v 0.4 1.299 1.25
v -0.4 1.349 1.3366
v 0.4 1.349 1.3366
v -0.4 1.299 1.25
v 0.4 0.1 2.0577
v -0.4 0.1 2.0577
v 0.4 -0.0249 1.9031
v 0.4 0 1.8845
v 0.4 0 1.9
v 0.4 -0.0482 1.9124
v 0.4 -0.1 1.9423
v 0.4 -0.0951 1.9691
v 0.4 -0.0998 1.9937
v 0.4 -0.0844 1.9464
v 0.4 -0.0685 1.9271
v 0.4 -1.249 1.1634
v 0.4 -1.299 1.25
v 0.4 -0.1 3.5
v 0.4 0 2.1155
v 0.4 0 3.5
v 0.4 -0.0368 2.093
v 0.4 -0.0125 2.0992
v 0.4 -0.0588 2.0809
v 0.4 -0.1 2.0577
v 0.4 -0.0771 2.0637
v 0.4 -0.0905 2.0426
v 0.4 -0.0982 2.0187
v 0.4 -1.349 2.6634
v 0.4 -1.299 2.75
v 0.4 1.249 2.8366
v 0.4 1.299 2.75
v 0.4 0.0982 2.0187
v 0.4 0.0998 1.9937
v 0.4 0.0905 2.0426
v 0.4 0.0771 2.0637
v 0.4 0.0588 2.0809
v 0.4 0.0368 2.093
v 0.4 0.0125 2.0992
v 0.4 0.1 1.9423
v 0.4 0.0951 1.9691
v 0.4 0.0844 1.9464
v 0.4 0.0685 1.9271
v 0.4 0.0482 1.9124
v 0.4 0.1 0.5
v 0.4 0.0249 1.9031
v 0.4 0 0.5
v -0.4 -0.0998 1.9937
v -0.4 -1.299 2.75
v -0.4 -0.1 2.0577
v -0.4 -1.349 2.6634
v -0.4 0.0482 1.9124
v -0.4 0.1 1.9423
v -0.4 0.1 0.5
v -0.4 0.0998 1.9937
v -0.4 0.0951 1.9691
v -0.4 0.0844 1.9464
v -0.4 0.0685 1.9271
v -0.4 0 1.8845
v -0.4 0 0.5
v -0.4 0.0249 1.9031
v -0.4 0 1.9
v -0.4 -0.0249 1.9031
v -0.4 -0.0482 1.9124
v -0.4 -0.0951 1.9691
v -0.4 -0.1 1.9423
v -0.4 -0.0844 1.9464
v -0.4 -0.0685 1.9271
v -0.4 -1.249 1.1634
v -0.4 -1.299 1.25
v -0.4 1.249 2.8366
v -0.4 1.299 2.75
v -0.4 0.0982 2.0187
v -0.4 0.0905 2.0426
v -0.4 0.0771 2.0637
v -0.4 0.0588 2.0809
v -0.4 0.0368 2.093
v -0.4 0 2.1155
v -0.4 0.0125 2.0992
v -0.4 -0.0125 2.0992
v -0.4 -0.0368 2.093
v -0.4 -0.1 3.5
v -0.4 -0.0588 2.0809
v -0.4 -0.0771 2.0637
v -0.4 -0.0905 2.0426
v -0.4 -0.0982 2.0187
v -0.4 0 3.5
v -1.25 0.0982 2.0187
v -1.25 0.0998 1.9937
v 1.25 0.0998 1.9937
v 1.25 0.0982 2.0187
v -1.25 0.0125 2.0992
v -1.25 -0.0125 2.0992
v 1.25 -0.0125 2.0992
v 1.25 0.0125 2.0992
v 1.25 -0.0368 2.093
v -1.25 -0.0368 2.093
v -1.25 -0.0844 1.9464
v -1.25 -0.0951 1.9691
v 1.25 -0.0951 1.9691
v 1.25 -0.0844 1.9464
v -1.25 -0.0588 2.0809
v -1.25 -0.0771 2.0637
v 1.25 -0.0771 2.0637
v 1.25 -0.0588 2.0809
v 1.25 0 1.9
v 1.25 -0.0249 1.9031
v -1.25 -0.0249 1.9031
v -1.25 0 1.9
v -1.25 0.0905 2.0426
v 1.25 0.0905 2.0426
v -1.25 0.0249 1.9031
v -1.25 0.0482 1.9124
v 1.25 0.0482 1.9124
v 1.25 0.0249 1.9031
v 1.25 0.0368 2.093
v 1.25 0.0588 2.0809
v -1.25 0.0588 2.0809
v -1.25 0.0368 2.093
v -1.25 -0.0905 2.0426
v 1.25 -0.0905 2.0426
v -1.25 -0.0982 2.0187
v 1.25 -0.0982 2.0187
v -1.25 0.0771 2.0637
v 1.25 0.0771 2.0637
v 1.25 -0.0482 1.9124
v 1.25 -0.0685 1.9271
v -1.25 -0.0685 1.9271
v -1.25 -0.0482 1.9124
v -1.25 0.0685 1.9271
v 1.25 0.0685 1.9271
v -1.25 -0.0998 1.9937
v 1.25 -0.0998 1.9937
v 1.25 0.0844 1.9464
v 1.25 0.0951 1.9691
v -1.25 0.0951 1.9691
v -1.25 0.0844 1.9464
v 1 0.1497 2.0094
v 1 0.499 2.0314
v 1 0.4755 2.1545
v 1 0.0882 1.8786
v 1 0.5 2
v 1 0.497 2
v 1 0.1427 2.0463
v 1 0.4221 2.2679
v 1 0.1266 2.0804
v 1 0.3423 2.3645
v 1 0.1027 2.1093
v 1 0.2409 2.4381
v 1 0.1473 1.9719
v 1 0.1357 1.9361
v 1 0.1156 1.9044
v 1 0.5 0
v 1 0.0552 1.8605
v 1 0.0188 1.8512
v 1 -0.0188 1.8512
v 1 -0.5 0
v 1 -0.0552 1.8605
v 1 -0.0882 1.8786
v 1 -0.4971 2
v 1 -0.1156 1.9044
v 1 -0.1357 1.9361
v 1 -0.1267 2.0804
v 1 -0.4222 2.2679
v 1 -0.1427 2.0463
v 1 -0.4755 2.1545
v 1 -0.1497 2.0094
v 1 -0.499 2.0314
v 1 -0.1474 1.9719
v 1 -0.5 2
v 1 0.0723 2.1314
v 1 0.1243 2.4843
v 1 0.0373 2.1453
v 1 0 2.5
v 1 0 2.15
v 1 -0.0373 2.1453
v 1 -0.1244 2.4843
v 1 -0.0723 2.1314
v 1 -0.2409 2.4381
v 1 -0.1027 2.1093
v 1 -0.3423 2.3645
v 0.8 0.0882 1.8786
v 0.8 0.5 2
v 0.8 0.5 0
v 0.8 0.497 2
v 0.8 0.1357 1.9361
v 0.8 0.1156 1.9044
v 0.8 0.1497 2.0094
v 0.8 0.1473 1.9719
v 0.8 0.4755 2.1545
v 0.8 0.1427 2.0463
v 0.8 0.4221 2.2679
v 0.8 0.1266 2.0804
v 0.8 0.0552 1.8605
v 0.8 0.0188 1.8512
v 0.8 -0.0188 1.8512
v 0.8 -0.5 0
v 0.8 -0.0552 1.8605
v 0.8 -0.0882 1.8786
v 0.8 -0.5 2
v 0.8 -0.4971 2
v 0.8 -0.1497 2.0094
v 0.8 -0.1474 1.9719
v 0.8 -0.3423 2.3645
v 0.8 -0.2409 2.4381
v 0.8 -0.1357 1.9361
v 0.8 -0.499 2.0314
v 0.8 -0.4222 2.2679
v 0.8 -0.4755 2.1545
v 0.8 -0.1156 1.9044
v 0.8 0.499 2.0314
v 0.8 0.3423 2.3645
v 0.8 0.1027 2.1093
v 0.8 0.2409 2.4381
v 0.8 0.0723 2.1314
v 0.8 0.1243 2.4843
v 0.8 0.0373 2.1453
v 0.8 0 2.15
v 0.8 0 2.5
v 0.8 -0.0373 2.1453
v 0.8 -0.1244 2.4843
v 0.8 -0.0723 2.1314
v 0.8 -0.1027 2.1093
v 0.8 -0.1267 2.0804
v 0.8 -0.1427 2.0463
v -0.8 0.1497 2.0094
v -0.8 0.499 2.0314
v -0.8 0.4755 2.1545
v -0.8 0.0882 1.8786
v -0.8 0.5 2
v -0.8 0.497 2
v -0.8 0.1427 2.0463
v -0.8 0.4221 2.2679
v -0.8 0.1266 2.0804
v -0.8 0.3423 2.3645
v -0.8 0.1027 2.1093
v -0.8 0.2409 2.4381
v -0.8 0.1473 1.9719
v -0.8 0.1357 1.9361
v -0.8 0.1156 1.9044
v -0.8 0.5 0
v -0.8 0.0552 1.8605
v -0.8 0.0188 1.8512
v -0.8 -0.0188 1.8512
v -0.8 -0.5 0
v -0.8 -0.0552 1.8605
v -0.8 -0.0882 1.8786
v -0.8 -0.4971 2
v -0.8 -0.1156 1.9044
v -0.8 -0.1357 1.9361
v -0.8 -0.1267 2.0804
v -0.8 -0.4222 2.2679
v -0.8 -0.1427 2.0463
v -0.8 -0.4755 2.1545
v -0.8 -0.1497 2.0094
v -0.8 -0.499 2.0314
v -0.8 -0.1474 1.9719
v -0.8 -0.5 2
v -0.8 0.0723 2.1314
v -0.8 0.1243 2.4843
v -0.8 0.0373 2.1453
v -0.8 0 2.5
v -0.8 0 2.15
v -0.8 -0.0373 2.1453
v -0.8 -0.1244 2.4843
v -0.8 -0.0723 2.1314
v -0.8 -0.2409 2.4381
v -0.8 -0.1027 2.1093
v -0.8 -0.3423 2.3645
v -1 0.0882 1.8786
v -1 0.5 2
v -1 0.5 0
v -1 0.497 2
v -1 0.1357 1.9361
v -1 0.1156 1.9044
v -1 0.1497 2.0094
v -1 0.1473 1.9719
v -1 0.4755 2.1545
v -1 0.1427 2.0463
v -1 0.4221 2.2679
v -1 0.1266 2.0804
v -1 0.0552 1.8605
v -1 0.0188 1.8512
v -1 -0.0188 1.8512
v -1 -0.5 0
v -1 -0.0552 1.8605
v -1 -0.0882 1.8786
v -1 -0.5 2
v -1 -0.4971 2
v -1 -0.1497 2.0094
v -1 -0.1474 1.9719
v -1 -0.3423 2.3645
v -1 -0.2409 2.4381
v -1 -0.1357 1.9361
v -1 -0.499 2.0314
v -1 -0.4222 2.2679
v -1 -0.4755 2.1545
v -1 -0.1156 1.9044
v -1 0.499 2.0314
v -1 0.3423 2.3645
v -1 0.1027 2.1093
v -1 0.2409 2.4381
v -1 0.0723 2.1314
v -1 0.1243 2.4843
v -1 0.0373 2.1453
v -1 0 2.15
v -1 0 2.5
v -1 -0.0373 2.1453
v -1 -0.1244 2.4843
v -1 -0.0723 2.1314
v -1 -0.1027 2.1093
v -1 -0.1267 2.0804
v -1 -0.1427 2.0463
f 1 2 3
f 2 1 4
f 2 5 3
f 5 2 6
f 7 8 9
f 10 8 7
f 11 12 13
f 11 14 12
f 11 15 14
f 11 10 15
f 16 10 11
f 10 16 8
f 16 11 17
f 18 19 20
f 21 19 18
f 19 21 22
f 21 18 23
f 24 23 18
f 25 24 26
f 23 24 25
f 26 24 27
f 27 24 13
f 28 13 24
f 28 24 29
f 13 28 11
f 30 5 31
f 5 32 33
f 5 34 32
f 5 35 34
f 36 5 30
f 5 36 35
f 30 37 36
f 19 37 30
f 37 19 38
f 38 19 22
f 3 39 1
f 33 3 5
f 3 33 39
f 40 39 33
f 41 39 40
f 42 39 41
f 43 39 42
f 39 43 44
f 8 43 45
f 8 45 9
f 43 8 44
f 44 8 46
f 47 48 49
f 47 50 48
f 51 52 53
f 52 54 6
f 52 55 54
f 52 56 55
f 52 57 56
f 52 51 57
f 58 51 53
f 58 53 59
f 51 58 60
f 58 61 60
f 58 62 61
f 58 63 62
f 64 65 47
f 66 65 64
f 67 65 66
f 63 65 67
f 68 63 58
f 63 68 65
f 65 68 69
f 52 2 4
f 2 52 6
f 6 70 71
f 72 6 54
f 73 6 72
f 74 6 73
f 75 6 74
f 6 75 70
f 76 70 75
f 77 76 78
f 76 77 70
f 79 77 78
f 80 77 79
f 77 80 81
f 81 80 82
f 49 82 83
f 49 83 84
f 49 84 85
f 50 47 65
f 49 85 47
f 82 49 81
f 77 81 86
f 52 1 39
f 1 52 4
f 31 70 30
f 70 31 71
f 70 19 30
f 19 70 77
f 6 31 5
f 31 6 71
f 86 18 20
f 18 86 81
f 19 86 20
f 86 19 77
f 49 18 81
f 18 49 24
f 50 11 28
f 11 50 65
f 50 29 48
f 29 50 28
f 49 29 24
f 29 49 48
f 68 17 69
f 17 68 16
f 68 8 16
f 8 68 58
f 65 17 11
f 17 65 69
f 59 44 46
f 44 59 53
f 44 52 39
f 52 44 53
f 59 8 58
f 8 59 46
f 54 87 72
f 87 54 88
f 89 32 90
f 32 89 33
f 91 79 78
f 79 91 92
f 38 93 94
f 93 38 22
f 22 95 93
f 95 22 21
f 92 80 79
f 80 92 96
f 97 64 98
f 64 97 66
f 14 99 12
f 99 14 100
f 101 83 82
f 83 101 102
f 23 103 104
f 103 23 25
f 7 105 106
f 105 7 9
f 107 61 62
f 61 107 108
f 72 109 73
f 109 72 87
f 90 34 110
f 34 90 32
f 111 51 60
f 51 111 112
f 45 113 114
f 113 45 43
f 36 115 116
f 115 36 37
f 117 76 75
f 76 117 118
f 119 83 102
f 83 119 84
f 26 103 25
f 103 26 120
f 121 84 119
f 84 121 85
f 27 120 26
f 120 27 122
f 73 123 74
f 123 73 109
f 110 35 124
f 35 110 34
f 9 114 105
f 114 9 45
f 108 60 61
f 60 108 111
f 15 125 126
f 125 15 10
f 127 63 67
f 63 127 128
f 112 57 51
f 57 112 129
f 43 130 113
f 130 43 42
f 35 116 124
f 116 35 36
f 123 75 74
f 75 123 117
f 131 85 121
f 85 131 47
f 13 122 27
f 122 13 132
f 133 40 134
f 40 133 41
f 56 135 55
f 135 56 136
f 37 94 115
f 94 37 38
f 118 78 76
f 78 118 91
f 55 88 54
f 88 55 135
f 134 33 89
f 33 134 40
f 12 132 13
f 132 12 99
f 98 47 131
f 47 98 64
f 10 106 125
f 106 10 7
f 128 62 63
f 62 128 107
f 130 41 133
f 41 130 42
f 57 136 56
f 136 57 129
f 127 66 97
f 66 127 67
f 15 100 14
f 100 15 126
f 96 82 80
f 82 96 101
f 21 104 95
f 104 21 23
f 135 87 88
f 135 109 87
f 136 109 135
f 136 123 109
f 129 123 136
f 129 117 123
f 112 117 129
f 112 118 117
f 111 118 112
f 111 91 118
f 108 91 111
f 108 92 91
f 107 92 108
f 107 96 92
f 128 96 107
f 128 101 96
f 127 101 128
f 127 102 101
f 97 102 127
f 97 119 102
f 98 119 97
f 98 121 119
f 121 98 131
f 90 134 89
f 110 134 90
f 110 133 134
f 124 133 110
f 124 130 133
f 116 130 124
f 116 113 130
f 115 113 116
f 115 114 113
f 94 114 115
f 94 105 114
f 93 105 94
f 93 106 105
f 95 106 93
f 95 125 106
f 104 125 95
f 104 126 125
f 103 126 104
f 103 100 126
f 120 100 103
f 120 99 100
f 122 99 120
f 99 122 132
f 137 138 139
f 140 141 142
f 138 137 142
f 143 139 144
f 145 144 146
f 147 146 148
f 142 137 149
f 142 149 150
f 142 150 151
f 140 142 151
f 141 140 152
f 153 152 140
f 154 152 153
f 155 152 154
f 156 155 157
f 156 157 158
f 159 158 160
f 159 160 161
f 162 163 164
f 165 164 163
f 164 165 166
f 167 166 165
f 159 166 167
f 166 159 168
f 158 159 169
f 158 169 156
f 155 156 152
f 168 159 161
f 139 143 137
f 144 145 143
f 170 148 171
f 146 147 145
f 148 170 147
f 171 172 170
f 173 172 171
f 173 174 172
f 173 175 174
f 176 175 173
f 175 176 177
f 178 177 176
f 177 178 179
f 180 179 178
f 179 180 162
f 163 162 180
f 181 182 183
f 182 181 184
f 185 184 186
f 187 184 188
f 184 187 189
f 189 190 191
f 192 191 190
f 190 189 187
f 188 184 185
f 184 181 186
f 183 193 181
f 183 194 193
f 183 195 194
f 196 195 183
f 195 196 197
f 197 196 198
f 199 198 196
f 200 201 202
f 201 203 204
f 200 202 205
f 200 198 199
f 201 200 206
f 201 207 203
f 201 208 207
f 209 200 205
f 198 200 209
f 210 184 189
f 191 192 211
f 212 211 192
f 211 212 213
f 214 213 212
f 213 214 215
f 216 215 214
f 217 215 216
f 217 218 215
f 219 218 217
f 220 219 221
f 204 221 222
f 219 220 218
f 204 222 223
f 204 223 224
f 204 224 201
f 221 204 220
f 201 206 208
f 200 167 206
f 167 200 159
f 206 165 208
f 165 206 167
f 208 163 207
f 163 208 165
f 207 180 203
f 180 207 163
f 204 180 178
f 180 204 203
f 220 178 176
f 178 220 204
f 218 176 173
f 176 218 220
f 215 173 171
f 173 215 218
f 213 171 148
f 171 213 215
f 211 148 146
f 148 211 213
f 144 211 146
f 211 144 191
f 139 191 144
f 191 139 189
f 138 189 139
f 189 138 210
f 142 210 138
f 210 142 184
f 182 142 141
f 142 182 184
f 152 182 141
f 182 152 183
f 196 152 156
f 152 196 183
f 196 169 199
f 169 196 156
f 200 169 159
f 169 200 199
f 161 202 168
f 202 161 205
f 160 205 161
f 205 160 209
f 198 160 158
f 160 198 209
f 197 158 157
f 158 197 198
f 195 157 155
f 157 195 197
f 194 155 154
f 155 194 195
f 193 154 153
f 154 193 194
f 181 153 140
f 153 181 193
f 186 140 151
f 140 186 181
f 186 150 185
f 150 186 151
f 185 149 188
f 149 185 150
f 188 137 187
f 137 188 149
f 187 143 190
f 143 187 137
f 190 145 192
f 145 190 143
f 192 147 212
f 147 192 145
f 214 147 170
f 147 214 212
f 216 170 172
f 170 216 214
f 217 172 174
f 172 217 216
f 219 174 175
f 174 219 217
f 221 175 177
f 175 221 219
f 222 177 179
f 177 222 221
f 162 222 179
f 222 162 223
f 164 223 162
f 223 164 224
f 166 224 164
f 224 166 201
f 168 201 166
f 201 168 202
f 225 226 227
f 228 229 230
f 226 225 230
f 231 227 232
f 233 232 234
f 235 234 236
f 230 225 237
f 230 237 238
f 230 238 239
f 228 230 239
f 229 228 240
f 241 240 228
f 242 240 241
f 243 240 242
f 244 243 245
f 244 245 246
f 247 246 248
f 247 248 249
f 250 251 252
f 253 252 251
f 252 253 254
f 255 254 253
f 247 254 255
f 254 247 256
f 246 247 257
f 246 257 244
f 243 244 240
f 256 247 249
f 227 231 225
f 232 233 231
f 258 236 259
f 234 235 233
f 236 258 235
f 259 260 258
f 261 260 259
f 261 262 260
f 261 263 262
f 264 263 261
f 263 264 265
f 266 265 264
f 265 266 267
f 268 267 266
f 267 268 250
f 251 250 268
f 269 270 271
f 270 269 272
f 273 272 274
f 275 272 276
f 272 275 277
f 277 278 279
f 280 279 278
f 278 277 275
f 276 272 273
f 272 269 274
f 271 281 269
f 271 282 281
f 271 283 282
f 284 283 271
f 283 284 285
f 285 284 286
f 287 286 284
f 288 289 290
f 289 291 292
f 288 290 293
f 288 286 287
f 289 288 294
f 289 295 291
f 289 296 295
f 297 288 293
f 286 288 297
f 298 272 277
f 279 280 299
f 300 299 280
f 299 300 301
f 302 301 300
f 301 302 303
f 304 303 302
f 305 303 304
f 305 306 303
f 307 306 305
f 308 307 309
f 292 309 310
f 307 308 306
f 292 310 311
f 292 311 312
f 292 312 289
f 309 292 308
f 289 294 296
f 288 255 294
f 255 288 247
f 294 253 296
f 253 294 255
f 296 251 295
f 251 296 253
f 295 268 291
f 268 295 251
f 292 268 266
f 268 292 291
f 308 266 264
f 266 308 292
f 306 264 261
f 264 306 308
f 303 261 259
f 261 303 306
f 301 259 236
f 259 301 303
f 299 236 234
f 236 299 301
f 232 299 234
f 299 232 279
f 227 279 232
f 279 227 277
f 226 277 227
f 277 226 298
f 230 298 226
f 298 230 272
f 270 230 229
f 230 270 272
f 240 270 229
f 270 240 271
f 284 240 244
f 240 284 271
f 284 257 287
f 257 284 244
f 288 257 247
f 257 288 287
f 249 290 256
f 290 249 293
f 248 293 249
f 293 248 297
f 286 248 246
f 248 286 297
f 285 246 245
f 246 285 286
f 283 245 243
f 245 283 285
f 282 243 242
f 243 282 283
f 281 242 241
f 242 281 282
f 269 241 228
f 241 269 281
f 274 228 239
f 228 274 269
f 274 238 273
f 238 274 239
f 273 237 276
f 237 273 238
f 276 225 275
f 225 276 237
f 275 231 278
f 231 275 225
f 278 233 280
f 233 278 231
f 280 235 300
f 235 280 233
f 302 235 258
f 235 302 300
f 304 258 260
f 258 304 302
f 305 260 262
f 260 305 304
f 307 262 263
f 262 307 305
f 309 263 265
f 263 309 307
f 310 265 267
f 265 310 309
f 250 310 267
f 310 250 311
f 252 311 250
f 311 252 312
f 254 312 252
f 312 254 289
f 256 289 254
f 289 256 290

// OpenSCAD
// file: base.scad
module base(r,h,$fn=$fn) {
    linear_extrude(h,scale = 0.5) {
        circle(r*2);
    }
}

base(1,1);
// file: support.scad
module support(h,r=1,dir=0,slope=90,$fn=$fn) {
    difference(){
        cylinder(h,r=r);
        translate([0,0,h])
        rotate([0,slope,dir])
        cylinder(h,r=r,center=true);
    }
}

support(10,1,dir=45,$fn=25);
// file: base_support.scad
use <support.scad>
use <base.scad>

module base_support(h=10,r=1,bh=1,dir=0,slope=90,$fn=$fn) {
    union() {
        base(r,bh);
        translate([0,0,bh])
        support(h-bh,r,dir,slope);
    }
}

base_support(10,1,bh=1,$fn=25);
// file: track.scad
use <base_support.scad>

$fn=25;

module track(length=1,radius=1,$fn=$fn) {
    translate([0,0,radius/2])
    rotate([90,0,0])
    difference(){
        cylinder(length,r=radius,center=true);
        union(){
            translate([-radius,0,-length/2-1])
            cube([radius*2,radius,length+2]);
            cylinder(length+1,r=radius*0.8,center=true);
        }
    };
}

module support_track(l=10,h=10,r=1,dir=0,slope=90,$fn=$fn){
    base_support(h,r,1,dir,slope);
    translate([0,0,h-0.5])
    rotate([slope-90,0,90+dir])
    track(l,r);
}

//track(25,5,$fn=25);

support_track(dir=30,slope=75);
// main file
use <track.scad>
$fn = 25;

//TODO
module spinner(l=1,w=2,h=1,r=0.15,$fn=$fn){
    translate([0,0,h])
    spoons(1.5);
    translate([1,0,0])
    stand(h=h,r=r);
    translate([-0.8,0,0])
    stand(h=h,r=r);
}

module spoon(l=0.8,w=0.1,h=1){
    translate([-l/2,0,-h])
    cube([l,w,h]);
}

module spoons(h=1,count=6){
    for(i = [1:count]){
        rotate([(360/count)*i,0,0])
        spoon(h=h);
    }
    rotate([0,90,0])
    cylinder(2.5,r=0.1,center=true);
}

module stand(l=1,w=0.2,h=1,r=0.2){
    translate([0,-l/2,0])
    rotate([0,270,0])
    linear_extrude(w)
    difference(){
        union(){
            square([h,l]);
            translate([h,l/2,0])
            circle(d=l);
        }
        translate([h,l/2,0])
        circle(r);
    }
}

spinner(h=2);
translate([0,0,-0.5])
%track(10,$fn=25);
